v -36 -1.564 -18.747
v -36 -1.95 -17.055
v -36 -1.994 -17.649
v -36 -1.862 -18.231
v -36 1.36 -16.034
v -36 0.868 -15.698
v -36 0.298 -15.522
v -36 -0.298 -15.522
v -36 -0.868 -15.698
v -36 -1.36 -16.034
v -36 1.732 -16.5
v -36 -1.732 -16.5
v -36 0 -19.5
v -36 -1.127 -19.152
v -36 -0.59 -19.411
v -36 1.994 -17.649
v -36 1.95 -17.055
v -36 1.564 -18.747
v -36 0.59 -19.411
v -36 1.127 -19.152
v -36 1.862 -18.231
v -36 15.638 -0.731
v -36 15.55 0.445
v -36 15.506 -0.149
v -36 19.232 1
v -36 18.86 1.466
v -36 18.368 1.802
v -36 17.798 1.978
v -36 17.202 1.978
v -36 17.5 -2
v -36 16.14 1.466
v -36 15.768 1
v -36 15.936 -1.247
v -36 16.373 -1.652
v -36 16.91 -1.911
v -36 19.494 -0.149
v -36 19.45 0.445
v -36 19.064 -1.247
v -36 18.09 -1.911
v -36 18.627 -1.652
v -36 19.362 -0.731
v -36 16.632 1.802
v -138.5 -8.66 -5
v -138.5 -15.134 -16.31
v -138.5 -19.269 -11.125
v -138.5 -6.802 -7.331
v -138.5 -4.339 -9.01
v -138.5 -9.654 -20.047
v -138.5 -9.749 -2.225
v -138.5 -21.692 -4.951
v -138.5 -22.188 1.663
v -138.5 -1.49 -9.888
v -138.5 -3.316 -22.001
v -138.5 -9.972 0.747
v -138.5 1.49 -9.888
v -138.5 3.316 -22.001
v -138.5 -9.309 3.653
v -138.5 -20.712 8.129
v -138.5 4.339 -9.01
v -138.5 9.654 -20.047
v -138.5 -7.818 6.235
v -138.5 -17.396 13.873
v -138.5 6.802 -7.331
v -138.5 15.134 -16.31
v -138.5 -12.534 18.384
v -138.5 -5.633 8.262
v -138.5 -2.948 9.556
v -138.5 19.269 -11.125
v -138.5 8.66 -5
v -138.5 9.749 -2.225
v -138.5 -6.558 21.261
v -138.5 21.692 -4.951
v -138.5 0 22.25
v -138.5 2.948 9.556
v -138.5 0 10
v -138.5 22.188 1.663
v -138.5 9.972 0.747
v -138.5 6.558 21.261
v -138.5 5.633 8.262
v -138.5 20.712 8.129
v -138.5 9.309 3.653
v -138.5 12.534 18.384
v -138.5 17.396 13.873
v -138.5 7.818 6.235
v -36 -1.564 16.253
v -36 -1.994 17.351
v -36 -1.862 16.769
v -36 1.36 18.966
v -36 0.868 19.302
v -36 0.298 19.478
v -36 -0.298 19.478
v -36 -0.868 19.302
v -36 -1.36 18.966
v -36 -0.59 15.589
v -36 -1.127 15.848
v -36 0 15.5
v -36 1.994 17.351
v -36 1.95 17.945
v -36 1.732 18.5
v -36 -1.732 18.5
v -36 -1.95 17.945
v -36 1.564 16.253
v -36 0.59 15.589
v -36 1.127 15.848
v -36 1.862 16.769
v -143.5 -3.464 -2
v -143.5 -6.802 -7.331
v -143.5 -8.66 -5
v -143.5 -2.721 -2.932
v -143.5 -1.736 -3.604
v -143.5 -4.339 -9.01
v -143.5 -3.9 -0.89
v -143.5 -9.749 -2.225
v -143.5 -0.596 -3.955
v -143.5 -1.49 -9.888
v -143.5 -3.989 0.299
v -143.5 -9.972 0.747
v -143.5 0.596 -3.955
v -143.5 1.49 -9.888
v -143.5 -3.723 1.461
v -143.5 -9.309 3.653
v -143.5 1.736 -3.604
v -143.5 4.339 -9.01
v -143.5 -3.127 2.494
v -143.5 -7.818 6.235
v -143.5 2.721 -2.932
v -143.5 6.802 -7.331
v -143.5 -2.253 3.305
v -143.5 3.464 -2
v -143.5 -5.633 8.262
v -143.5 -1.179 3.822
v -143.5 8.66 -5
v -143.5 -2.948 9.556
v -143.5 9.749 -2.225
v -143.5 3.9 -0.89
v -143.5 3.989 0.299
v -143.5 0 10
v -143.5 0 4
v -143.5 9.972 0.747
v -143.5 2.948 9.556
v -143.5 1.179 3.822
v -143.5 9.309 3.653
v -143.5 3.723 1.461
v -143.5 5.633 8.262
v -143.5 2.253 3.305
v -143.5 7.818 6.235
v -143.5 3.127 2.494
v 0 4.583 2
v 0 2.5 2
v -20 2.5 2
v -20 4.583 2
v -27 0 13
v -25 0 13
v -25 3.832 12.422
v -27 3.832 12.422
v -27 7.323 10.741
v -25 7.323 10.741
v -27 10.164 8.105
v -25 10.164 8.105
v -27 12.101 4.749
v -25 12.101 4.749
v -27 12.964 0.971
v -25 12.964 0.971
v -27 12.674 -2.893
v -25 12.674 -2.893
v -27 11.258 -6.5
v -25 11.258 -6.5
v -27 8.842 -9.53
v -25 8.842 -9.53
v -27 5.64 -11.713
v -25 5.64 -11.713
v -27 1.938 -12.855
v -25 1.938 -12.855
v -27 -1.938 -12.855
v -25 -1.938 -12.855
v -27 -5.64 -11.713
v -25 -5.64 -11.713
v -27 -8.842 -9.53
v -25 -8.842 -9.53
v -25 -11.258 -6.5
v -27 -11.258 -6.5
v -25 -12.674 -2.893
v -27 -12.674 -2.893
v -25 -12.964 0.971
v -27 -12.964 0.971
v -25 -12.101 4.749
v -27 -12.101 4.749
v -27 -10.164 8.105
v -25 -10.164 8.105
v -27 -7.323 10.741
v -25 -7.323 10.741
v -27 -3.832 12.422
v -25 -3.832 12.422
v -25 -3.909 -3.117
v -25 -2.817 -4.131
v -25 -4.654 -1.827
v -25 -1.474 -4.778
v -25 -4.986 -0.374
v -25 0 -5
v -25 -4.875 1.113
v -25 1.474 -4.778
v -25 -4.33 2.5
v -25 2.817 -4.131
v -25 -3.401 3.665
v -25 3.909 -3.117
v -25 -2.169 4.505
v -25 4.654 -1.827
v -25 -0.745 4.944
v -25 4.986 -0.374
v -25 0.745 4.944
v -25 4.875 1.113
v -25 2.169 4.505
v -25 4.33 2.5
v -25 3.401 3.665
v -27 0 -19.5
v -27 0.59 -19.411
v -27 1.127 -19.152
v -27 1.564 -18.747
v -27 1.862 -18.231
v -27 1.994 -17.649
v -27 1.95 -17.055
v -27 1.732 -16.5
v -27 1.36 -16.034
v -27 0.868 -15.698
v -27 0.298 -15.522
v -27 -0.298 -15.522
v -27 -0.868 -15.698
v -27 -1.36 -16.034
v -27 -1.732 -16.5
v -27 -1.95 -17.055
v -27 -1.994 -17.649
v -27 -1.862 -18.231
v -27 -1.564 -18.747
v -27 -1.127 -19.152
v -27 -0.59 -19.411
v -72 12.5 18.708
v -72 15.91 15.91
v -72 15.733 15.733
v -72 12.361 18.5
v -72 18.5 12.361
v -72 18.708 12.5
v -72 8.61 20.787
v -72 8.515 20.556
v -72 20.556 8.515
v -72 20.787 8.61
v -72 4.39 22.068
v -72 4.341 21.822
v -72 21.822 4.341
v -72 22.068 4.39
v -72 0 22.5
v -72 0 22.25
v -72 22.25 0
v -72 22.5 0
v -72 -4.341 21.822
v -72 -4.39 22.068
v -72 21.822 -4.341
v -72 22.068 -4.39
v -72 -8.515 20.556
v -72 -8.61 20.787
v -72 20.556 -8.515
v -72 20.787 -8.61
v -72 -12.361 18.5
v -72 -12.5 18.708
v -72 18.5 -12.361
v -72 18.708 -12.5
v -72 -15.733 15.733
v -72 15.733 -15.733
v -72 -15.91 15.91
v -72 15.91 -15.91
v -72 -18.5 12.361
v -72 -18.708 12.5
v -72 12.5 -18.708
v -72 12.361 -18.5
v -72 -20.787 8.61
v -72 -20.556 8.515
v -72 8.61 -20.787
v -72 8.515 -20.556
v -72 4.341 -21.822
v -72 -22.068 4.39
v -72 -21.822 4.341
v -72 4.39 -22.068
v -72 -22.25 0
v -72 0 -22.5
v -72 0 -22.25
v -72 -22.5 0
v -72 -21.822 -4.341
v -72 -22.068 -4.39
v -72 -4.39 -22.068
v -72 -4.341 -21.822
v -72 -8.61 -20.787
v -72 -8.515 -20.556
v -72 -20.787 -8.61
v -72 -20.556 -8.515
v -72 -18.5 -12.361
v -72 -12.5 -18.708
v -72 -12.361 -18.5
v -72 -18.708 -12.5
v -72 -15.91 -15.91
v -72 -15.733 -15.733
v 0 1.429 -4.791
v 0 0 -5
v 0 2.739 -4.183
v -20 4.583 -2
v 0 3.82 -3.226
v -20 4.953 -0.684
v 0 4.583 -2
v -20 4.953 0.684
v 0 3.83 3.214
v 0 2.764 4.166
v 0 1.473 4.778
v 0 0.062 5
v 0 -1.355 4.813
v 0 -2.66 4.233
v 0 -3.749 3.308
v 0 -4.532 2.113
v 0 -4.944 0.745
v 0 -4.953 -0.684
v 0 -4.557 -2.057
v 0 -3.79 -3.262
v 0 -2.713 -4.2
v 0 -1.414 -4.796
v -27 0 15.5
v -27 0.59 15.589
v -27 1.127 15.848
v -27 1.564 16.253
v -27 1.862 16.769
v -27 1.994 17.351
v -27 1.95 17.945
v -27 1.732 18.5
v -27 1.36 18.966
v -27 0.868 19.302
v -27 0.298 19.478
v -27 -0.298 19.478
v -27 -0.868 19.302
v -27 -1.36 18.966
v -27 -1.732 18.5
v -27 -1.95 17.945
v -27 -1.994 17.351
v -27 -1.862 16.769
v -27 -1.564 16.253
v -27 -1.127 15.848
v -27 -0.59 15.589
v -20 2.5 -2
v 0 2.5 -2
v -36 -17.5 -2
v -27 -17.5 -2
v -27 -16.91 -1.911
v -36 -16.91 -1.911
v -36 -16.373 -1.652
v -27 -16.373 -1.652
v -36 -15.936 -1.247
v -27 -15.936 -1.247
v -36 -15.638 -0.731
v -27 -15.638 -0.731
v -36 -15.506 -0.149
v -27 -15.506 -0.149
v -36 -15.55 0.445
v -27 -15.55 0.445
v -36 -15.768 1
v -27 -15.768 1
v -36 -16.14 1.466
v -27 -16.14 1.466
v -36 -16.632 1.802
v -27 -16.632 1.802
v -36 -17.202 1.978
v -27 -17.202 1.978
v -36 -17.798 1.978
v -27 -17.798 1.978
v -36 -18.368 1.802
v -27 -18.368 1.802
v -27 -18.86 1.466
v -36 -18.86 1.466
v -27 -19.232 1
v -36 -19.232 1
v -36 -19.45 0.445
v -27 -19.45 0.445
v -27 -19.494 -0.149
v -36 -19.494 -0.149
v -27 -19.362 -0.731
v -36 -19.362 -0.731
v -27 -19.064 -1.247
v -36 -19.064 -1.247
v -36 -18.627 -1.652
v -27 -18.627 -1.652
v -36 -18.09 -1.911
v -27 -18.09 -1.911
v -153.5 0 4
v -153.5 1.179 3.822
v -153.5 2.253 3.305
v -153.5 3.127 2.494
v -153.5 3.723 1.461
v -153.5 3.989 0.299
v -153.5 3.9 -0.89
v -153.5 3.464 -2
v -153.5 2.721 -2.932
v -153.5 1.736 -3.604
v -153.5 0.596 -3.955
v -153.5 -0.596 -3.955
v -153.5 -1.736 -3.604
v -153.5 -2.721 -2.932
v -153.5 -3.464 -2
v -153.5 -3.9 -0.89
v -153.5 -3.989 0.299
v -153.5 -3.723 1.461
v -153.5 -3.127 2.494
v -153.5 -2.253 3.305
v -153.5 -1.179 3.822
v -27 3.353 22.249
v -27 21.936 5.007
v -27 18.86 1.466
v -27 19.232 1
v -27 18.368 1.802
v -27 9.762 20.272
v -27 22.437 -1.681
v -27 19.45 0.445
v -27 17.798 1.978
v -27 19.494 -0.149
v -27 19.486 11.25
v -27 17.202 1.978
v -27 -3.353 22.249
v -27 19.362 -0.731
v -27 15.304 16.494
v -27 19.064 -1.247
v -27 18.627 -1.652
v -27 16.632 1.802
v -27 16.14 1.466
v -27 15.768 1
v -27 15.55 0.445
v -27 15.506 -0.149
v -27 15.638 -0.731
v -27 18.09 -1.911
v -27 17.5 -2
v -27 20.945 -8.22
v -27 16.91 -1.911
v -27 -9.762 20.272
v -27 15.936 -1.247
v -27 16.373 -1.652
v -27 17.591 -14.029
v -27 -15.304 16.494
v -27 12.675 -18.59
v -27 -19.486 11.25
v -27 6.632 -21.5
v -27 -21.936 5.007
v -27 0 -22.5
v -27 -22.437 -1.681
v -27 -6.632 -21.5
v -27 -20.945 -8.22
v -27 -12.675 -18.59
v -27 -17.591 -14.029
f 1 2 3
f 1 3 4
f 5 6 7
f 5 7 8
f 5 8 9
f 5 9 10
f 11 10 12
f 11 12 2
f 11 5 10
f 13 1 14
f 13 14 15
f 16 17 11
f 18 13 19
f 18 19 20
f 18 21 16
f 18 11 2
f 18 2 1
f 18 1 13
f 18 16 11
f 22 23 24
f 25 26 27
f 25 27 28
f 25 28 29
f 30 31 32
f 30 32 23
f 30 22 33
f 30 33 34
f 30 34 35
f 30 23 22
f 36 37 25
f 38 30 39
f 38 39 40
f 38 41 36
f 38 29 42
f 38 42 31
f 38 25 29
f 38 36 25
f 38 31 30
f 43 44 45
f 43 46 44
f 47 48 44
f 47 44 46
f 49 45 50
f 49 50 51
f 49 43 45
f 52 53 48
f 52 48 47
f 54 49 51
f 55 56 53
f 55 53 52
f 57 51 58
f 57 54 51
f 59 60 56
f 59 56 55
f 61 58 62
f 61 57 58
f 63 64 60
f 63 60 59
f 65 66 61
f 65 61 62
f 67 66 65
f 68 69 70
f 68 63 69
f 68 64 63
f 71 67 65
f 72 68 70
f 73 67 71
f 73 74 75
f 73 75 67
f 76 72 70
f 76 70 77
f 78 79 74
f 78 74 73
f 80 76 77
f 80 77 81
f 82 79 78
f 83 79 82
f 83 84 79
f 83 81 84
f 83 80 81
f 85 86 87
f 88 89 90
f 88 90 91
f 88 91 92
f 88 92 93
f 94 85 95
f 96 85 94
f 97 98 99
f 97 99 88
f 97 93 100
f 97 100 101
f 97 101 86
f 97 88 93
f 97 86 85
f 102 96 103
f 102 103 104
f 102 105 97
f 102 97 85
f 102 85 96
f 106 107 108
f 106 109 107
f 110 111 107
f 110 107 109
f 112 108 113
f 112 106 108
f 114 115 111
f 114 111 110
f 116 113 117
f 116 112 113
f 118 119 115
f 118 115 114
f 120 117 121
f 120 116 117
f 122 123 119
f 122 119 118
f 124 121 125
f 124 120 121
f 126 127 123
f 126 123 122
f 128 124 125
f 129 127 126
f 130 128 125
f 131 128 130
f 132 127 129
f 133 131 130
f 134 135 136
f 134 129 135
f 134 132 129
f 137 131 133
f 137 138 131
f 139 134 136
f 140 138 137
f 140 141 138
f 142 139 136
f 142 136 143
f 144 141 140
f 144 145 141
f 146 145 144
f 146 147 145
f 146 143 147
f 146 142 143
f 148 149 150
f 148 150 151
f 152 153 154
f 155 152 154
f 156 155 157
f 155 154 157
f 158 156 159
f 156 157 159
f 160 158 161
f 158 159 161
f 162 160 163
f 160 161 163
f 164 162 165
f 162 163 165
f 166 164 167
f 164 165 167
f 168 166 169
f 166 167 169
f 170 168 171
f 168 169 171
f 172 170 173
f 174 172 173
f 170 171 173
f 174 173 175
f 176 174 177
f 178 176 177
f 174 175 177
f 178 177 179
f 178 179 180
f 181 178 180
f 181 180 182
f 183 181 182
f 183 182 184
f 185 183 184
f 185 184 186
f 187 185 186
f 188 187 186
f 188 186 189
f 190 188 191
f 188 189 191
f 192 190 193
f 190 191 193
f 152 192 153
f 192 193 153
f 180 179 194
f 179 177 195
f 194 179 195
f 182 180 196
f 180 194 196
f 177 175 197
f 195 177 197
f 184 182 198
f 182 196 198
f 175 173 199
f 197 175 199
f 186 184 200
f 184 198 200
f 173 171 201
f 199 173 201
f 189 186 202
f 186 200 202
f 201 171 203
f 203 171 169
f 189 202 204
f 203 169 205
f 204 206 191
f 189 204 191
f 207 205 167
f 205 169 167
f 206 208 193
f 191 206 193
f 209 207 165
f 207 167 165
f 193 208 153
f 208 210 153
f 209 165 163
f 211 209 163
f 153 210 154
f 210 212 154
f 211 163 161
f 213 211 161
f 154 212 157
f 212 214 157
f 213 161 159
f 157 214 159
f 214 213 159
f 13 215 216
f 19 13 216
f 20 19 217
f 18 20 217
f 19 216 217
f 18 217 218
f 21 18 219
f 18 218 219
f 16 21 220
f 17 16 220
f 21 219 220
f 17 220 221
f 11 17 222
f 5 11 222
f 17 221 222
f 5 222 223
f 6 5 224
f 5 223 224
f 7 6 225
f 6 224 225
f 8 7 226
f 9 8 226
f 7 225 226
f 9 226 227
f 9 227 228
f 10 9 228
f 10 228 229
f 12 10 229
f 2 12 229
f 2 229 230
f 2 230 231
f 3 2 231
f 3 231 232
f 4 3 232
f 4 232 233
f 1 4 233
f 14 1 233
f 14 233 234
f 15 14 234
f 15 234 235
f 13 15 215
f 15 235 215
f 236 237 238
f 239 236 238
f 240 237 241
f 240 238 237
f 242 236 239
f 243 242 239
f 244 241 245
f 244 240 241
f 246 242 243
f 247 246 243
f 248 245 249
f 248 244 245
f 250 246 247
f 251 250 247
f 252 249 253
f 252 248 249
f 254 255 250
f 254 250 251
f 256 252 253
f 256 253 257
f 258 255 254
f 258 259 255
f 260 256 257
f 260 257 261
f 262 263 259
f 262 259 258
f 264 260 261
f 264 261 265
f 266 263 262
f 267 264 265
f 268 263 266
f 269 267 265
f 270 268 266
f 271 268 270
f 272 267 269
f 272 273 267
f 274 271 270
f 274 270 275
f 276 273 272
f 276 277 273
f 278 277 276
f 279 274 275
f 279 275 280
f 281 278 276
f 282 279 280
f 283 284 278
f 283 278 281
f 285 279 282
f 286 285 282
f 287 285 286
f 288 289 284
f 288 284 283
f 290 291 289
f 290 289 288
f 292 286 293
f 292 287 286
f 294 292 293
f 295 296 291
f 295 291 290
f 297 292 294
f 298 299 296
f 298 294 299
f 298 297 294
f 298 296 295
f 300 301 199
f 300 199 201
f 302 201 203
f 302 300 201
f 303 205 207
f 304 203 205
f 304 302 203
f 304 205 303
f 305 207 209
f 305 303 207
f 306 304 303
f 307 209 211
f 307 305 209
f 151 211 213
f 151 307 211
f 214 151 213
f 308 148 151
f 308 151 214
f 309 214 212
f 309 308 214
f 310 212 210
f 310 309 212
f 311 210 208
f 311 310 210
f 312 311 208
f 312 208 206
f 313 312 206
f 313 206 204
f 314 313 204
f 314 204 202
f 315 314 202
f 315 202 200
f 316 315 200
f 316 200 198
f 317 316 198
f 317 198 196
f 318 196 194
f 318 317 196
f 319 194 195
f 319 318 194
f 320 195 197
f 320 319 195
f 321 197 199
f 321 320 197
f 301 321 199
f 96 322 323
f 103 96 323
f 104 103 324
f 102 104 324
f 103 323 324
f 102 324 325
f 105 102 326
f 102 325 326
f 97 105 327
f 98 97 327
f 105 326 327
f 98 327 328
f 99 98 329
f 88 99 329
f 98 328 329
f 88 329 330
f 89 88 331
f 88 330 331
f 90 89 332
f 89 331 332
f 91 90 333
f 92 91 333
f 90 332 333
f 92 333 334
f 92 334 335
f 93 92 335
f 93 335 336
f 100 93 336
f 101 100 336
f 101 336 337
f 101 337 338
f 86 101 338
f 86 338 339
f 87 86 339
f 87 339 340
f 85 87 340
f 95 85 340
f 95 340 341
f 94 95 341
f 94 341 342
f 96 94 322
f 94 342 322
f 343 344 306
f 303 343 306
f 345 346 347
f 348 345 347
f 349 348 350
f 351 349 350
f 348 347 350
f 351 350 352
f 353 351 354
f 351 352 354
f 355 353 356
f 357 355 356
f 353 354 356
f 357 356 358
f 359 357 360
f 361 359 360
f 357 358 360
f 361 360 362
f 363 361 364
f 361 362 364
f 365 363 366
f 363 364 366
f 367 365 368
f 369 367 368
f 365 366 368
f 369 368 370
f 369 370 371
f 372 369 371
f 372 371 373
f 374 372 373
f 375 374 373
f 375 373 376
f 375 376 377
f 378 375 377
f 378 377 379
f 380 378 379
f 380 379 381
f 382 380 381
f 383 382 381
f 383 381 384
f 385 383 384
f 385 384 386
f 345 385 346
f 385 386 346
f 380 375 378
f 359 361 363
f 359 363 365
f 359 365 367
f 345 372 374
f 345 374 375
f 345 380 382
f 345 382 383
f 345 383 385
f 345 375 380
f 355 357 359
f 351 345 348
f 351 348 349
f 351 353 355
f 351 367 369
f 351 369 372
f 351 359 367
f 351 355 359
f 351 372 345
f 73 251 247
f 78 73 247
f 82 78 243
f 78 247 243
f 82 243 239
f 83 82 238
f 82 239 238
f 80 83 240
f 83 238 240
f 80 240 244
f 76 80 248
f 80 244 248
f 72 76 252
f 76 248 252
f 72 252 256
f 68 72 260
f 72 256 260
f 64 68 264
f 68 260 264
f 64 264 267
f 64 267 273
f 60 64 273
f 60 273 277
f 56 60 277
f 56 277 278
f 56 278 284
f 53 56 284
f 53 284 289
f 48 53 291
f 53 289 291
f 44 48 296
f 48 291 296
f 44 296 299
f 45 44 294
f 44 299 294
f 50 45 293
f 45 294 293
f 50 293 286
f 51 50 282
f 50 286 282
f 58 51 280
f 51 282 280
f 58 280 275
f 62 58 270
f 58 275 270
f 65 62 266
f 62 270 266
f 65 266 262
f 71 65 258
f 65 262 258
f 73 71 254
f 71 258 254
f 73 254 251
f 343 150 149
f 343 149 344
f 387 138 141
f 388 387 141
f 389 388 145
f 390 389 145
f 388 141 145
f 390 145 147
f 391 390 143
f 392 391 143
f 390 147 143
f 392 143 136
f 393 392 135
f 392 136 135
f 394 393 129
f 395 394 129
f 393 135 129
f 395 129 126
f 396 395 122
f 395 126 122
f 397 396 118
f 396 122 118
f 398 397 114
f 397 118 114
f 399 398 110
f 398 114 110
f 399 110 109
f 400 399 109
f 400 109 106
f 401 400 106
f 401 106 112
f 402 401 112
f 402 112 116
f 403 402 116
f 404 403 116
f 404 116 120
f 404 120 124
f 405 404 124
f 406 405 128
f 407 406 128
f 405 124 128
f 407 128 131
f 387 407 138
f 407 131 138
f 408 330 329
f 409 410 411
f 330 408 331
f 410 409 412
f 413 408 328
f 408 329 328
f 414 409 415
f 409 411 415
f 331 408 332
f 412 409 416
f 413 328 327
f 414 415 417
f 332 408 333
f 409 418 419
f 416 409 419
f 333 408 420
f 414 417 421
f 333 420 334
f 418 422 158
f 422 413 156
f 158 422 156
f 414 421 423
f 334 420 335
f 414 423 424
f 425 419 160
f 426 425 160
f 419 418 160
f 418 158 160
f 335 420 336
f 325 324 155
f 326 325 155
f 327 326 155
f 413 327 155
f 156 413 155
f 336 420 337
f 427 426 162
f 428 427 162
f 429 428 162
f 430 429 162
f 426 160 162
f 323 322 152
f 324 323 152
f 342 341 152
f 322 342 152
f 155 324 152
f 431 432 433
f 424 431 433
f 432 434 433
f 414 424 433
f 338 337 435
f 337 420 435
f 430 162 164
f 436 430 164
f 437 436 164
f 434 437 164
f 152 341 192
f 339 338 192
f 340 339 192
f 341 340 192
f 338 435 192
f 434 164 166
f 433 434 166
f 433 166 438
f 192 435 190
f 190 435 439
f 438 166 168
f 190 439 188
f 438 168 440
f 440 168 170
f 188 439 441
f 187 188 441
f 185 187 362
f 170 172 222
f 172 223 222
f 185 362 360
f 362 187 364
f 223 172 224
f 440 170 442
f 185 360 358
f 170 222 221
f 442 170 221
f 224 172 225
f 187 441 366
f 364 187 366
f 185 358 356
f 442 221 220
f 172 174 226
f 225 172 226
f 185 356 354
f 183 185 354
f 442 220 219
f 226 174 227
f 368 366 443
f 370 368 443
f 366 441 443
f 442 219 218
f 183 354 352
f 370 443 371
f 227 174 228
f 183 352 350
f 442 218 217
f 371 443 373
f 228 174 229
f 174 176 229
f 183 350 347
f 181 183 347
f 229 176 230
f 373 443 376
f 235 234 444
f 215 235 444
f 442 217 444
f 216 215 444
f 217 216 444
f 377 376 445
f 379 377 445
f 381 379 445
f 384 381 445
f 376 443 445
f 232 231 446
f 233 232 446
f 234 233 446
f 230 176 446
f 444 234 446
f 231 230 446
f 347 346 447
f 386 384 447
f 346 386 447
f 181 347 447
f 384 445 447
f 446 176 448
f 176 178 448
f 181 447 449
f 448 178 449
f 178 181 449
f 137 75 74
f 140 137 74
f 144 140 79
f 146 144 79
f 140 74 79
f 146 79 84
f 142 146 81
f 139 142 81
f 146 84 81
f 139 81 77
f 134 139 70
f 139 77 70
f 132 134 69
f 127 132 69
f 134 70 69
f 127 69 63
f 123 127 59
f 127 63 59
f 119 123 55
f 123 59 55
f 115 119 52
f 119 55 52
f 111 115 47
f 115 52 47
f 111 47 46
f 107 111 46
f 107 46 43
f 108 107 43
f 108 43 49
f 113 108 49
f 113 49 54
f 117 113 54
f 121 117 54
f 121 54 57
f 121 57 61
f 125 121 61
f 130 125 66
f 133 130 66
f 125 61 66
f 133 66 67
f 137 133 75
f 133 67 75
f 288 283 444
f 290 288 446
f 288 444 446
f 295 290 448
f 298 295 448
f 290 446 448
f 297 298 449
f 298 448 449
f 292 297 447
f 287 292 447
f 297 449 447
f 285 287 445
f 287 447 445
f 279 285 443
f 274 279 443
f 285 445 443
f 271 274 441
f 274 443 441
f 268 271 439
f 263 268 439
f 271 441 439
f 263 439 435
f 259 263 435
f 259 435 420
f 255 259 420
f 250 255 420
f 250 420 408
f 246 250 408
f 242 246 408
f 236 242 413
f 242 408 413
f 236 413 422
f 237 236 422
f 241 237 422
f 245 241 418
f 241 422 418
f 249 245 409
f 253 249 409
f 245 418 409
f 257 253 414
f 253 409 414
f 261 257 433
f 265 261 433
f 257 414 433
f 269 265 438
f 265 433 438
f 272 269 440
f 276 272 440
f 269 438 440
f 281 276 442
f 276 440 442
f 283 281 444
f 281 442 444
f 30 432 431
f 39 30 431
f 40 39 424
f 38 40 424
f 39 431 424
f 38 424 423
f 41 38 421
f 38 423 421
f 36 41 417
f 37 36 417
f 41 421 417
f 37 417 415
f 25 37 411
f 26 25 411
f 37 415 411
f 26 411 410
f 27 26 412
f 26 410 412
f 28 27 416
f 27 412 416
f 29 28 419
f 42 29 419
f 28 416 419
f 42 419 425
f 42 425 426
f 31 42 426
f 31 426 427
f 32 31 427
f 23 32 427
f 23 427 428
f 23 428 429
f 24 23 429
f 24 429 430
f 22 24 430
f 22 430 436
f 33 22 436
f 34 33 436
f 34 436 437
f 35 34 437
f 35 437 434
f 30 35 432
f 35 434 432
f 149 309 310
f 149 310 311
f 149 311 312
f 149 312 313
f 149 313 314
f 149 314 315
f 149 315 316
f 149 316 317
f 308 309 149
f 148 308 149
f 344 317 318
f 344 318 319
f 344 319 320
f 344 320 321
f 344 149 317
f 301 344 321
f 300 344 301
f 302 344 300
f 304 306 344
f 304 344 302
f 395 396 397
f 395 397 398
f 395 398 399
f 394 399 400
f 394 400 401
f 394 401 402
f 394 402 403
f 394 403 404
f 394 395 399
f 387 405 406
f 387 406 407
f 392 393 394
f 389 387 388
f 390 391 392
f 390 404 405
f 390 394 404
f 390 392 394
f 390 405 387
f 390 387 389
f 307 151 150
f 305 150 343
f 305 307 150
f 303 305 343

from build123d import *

# Parameters (mm, degrees)
SKETCH1_R           = 5
BOSS_EXTRUDE1_DEPTH = 25
SKETCH2_R           = 13
BOSS_EXTRUDE2_DEPTH = 2
SKETCH3_R           = 22.5
BOSS_EXTRUDE3_DEPTH = 45
SKETCH4_R           = 22.25
BOSS_EXTRUDE4_DEPTH = 66.5
SKETCH5_R           = 10
BOSS_EXTRUDE5_DEPTH = 5
SKETCH6_R           = 4
BOSS_EXTRUDE6_DEPTH = 10
SKETCH7_R           = 2
CUT_EXTRUDE1_DEPTH  = 9
SKETCH8_W           = 4
SKETCH8_H           = 2.5
CUT_EXTRUDE2_DEPTH  = 20


with BuildPart() as part:
    # Sketch1 → Boss-Extrude1 (new body)
    with BuildSketch(Plane(origin=(0, 0, 0), x_dir=(0, 0, -1), z_dir=(1, 0, 0))):
        Circle(SKETCH1_R)
    extrude(amount=-BOSS_EXTRUDE1_DEPTH)

    # Sketch2 → Boss-Extrude2 (add)
    with BuildSketch(Plane.ZY.offset(25)):
        Circle(SKETCH2_R)
    extrude(amount=BOSS_EXTRUDE2_DEPTH)

    # Sketch3 → Boss-Extrude3 (add)
    with BuildSketch(Plane.ZY.offset(27)):
        with Locations(Location((0, 0, 0), (0, 0, 180))):
            Circle(SKETCH3_R)
    extrude(amount=BOSS_EXTRUDE3_DEPTH)

    # Sketch4 → Boss-Extrude4 (add)
    with BuildSketch(Plane.ZY.offset(72)):
        Circle(SKETCH4_R)
    extrude(amount=BOSS_EXTRUDE4_DEPTH)

    # Sketch5 → Boss-Extrude5 (add)
    with BuildSketch(Plane.ZY.offset(138.5)):
        Circle(SKETCH5_R)
    extrude(amount=BOSS_EXTRUDE5_DEPTH)

    # Sketch6 → Boss-Extrude6 (add)
    with BuildSketch(Plane.ZY.offset(143.5)):
        Circle(SKETCH6_R)
    extrude(amount=BOSS_EXTRUDE6_DEPTH)

    # Sketch7 → Cut-Extrude1 (cut)
    with BuildSketch(Plane(origin=(-27, 0, 0), x_dir=(0, 0, -1), z_dir=(1, 0, 0))):
        with Locations((0, 17.5)):
            Circle(SKETCH7_R)
        with Locations((17.5, 0)):
            Circle(SKETCH7_R)
        with Locations((0, -17.5)):
            Circle(SKETCH7_R)
        with Locations((-17.5, 0)):
            Circle(SKETCH7_R)
    extrude(amount=-CUT_EXTRUDE1_DEPTH, mode=Mode.SUBTRACT)

    # Sketch8 → Cut-Extrude2 (cut)
    with BuildSketch(Plane(origin=(0, 0, 0), x_dir=(0, 0, -1), z_dir=(1, 0, 0))):
        with Locations((0, 3.75)):
            Rectangle(SKETCH8_W, SKETCH8_H)
    extrude(amount=-CUT_EXTRUDE2_DEPTH, mode=Mode.SUBTRACT)


solid = part.part
